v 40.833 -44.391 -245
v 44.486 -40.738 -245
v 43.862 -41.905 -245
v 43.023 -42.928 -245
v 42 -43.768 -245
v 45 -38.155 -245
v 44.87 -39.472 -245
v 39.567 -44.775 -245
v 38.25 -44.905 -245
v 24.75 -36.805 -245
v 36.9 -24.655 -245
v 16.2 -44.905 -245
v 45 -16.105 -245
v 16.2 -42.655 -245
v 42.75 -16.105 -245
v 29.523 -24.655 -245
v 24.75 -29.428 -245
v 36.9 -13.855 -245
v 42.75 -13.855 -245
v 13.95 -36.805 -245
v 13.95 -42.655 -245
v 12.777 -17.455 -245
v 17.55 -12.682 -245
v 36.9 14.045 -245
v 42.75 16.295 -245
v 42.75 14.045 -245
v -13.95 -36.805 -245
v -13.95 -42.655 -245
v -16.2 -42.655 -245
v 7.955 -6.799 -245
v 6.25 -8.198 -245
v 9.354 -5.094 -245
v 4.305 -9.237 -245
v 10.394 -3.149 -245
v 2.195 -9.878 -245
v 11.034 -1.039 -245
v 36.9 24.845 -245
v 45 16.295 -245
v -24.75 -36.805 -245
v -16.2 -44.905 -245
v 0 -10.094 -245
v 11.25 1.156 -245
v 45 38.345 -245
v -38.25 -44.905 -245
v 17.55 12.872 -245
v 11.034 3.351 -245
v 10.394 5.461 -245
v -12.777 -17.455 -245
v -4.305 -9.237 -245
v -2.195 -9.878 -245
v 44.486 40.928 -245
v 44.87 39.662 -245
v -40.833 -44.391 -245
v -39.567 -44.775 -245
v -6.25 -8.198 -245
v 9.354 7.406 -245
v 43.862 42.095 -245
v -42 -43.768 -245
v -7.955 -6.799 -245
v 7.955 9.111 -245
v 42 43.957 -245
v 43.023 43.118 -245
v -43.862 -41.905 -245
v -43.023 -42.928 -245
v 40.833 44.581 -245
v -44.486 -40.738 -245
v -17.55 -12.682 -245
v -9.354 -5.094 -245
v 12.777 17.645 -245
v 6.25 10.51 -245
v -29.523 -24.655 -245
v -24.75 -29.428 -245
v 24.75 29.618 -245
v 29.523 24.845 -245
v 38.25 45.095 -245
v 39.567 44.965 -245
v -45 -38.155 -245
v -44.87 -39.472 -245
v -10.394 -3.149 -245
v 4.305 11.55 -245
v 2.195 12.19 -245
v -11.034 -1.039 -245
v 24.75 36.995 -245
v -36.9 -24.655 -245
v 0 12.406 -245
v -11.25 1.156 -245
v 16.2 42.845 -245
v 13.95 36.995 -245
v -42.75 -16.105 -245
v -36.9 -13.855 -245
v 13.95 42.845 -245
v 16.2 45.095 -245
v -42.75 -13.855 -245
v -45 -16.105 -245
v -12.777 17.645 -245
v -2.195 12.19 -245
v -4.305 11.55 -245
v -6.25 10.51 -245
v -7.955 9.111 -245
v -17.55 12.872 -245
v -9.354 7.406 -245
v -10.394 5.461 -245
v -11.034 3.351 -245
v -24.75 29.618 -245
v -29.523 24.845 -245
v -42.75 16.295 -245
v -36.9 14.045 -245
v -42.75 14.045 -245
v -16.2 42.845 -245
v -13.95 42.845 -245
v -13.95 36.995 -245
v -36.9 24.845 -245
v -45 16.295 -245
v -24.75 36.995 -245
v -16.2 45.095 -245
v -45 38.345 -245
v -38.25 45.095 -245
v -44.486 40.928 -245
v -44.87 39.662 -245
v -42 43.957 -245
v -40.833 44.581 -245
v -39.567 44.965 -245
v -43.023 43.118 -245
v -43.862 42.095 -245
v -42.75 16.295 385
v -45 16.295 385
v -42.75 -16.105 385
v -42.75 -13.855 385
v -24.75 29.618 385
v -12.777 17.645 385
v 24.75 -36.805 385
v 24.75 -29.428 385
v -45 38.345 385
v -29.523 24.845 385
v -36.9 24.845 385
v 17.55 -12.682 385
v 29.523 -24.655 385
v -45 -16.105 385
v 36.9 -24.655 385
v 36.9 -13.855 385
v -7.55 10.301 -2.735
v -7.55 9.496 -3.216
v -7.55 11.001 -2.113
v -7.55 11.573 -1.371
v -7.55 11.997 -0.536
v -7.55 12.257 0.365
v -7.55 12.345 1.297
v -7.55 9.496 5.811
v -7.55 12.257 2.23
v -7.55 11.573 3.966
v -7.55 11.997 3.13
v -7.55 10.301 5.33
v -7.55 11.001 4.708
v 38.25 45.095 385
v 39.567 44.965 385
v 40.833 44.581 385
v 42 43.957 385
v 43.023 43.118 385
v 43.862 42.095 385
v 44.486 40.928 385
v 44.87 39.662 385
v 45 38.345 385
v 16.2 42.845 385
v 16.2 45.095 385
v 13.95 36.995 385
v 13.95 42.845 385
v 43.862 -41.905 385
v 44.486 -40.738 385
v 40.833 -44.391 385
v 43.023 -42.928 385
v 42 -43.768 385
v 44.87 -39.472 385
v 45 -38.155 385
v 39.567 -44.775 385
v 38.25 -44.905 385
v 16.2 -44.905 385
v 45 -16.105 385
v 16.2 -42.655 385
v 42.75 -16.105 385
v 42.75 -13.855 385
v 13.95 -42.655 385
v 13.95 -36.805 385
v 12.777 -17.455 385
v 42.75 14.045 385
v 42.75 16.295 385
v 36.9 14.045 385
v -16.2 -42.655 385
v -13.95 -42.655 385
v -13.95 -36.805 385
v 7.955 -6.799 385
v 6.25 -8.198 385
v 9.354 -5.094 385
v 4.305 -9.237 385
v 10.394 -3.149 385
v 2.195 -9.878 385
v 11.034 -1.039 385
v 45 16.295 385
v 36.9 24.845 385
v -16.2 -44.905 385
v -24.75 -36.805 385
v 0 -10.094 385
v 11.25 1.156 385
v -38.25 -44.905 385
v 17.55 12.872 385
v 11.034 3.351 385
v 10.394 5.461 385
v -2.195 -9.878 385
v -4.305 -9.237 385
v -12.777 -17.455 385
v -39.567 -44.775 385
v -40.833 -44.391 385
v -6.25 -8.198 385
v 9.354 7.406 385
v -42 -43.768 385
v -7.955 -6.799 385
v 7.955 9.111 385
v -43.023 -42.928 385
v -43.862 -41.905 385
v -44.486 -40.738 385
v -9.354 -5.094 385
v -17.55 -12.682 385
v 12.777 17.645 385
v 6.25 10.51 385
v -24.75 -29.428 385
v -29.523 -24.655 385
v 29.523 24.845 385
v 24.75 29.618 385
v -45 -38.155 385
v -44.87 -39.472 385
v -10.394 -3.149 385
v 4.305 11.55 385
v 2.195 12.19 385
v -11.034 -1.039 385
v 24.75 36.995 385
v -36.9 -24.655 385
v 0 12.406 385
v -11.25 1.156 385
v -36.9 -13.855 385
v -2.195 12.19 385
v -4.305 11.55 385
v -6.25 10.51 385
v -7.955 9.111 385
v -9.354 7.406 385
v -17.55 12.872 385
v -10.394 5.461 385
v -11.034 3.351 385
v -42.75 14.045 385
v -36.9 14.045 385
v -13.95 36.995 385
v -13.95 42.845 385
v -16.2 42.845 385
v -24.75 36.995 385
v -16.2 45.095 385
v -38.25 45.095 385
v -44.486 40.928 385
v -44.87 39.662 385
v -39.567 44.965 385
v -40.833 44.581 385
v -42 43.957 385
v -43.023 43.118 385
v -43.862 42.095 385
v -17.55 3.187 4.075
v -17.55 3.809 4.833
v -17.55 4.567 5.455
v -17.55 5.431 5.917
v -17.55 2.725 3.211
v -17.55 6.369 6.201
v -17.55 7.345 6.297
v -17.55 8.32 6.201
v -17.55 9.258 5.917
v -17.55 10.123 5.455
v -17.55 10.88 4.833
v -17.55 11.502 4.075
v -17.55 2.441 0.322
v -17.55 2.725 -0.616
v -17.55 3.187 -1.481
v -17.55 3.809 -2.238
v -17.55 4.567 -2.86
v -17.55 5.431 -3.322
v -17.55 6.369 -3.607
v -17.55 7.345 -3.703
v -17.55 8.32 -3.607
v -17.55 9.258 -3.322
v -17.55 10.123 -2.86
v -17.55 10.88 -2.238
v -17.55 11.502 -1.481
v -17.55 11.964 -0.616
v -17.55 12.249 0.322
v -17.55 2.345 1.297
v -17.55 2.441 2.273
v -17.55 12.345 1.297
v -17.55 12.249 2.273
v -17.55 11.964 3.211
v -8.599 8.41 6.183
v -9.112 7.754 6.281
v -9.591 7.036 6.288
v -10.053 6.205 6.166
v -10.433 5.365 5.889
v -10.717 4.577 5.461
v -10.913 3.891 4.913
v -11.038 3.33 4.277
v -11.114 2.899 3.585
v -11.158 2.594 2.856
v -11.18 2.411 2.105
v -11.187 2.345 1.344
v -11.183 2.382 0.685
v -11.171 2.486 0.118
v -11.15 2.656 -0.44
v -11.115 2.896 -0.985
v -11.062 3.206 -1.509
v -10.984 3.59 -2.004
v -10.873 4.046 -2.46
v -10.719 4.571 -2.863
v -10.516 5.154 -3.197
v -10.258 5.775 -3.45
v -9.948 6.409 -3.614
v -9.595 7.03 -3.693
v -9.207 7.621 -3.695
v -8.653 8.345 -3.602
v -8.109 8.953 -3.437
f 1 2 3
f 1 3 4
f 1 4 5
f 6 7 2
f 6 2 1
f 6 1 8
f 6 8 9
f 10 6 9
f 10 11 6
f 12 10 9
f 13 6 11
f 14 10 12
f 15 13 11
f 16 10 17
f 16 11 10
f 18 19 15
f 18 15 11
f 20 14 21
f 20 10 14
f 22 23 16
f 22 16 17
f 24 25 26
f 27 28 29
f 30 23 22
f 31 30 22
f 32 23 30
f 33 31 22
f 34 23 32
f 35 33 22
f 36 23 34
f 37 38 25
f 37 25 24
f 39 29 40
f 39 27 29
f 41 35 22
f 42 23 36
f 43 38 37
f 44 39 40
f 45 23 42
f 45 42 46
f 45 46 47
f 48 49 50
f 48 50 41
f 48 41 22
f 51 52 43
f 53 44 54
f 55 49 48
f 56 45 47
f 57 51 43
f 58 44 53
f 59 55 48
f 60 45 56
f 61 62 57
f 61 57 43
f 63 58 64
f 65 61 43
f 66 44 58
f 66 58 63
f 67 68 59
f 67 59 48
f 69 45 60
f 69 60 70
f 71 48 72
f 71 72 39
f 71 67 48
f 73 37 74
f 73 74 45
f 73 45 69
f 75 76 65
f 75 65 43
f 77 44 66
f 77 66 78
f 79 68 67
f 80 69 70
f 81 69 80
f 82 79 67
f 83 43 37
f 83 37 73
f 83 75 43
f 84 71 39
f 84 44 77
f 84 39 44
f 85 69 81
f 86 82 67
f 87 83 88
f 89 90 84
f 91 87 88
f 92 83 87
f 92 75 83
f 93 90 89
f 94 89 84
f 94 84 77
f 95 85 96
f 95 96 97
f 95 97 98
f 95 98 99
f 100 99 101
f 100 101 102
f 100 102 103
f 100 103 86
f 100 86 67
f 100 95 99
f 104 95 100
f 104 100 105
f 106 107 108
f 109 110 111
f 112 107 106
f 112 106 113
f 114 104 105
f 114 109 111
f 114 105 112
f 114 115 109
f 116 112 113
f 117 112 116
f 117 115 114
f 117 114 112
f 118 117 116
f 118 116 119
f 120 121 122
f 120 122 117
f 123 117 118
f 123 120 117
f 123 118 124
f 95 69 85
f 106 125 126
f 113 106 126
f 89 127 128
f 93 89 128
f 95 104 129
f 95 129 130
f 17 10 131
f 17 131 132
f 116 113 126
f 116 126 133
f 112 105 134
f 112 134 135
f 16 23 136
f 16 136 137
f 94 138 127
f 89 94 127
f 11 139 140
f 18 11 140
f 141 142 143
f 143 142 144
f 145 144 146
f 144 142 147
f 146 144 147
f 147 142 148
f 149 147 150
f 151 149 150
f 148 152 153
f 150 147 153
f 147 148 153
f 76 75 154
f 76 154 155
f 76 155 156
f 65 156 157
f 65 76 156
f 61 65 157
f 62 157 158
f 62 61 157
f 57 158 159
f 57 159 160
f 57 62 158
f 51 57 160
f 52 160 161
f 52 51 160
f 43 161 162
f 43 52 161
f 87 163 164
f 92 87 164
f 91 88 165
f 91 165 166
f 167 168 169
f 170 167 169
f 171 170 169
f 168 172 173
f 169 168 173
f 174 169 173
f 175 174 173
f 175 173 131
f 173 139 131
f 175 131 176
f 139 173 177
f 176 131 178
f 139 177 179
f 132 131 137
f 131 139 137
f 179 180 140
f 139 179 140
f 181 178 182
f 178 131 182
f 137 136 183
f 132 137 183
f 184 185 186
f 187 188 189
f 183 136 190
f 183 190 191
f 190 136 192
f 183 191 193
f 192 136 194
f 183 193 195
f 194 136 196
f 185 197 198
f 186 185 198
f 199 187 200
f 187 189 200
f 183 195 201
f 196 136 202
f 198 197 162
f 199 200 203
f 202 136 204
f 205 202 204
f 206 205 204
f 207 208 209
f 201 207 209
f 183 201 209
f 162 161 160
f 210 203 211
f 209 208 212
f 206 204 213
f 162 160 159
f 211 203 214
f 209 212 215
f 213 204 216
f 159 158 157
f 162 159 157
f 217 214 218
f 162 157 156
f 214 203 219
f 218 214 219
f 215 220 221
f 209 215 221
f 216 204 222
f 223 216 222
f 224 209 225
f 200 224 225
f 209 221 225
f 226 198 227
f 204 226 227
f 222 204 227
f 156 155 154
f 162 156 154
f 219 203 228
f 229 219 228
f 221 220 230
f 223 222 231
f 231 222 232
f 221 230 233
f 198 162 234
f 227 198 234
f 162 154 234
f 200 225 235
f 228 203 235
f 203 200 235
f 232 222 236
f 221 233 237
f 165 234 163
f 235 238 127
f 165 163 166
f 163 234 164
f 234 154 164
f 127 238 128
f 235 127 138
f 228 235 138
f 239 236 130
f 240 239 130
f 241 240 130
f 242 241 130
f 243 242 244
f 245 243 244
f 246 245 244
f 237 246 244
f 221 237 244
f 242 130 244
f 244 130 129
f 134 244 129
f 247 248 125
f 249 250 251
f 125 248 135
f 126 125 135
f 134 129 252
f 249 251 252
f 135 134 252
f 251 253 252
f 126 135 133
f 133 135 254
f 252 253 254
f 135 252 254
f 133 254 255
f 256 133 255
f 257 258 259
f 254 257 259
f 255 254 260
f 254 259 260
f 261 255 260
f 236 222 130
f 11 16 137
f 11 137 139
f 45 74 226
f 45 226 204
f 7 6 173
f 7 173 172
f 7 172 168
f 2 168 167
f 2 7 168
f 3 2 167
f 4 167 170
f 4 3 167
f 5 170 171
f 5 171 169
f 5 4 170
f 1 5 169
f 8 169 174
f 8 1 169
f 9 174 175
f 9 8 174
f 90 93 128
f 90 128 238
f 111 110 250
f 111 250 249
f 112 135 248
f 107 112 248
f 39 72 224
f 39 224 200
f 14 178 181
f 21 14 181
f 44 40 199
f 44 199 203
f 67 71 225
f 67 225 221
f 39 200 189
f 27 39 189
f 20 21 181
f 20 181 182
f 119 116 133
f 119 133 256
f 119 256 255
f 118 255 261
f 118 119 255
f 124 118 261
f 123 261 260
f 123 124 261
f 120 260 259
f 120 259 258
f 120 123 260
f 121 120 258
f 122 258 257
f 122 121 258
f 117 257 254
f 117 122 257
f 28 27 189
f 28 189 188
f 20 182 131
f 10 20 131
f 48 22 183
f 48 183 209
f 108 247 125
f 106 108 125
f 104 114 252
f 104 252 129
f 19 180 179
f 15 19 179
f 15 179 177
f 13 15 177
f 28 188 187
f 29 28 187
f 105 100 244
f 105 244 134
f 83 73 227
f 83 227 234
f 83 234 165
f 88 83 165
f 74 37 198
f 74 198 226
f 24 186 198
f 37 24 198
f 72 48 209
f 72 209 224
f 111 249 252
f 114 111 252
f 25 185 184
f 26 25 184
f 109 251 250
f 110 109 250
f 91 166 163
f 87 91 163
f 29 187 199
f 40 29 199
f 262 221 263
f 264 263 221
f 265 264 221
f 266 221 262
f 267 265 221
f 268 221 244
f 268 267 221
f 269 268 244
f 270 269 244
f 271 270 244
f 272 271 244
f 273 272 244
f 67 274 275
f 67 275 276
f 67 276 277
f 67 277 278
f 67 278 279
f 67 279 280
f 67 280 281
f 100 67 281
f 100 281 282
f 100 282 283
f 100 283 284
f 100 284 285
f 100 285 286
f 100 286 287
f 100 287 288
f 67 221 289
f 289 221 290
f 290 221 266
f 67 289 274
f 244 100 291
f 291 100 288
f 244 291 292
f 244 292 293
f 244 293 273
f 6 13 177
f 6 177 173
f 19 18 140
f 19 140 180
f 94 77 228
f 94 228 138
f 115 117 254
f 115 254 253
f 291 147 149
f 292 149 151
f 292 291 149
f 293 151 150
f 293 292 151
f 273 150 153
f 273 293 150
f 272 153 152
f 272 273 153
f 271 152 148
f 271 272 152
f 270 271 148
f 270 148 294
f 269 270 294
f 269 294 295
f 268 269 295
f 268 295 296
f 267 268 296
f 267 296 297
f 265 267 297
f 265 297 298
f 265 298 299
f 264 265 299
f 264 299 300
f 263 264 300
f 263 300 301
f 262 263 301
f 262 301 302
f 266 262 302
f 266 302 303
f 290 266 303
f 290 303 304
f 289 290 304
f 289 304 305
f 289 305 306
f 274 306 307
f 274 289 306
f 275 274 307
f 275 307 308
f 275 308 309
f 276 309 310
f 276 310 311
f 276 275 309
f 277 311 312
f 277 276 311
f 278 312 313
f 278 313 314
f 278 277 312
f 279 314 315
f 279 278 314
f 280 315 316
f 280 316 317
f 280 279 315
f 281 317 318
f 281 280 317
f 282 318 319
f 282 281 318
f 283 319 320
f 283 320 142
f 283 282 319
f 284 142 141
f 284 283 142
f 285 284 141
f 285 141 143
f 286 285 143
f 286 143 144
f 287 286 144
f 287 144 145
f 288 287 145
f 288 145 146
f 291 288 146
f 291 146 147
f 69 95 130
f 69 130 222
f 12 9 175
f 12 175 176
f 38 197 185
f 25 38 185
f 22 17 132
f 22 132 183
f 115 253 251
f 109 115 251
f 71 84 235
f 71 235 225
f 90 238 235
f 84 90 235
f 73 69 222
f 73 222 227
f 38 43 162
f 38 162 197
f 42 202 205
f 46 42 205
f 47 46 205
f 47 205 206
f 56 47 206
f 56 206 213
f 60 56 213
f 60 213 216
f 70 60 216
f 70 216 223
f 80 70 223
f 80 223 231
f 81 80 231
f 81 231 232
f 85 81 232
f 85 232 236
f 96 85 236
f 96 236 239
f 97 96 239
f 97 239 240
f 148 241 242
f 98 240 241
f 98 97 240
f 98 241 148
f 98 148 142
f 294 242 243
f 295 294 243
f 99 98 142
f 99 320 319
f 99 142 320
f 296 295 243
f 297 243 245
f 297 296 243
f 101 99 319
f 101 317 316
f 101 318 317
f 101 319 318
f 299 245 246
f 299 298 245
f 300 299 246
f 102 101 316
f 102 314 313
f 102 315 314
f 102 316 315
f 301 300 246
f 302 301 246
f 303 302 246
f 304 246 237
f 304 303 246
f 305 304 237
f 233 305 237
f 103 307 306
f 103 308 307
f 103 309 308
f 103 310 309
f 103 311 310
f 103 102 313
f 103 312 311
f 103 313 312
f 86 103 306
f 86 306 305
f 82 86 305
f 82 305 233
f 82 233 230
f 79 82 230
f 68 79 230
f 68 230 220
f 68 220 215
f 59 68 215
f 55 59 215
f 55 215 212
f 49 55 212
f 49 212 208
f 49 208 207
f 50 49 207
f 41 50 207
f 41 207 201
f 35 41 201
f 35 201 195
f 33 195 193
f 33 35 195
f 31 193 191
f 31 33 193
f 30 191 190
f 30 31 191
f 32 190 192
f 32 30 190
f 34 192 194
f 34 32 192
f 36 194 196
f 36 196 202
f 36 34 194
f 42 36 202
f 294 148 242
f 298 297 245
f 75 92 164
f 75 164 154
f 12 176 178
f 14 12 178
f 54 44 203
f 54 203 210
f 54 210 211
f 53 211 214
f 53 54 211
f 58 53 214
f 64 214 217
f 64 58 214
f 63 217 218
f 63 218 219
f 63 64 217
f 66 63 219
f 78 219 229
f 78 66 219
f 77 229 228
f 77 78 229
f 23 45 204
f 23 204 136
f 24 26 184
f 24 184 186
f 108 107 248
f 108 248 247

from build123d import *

# Parameters (mm, degrees)
SKETCH1_R           = 2.5
BOSS_EXTRUDE1_DEPTH = 140
SCALE_2_SCALE       = 3
SCALE_3_SCALE       = 6
SCALE_5_SCALE       = 2
SCALE_6_SCALE       = 0.25
SCALE_7_SCALE       = 0.125
SCALE_8_SCALE       = 0.25
SCALE_9_SCALE       = 4
SCALE_10_SCALE      = 4
OTHER_START         = -17.55
OTHER_1_OUTLINE_R   = 5
OTHER_1_DEPTH       = 10


# Read off the part's stored shape, not the designer's step: 孔1
with BuildPart() as part:
    # Sketch1 → Boss-Extrude1 (new body)
    with BuildSketch(Plane.XY):
        with BuildLine():
            Line((2.839339828, 3.9), (5.5, 6.560660172))
            Line((5.5, 6.560660172), (5.5, 8.2))
            Line((5.5, 8.2), (3.1, 8.2))
            Line((3.1, 8.2), (3.1, 9.5))
            Line((3.1, 9.5), (3.6, 9.5))
            Line((3.6, 9.5), (3.6, 10))
            Line((3.6, 10), (8.5, 10))
            ThreePointArc((8.5, 10), (9.560660172, 9.560660172), (10, 8.5))
            Line((10, 8.5), (10, 3.6))
            Line((10, 3.6), (9.5, 3.6))
            Line((9.5, 3.6), (9.5, 3.1))
            Line((9.5, 3.1), (8.2, 3.1))
            Line((8.2, 3.1), (8.2, 5.5))
            Line((8.2, 5.5), (6.560660172, 5.5))
            Line((6.560660172, 5.5), (3.9, 2.839339828))
            Line((3.9, 2.839339828), (3.9, -2.839339828))
            Line((3.9, -2.839339828), (6.560660172, -5.5))
            Line((6.560660172, -5.5), (8.2, -5.5))
            Line((8.2, -5.5), (8.2, -3.1))
            Line((8.2, -3.1), (9.5, -3.1))
            Line((9.5, -3.1), (9.5, -3.6))
            Line((9.5, -3.6), (10, -3.6))
            Line((10, -3.6), (10, -8.5))
            ThreePointArc((10, -8.5), (9.560660172, -9.560660172), (8.5, -10))
            Line((8.5, -10), (3.6, -10))
            Line((3.6, -10), (3.6, -9.5))
            Line((3.6, -9.5), (3.1, -9.5))
            Line((3.1, -9.5), (3.1, -8.2))
            Line((3.1, -8.2), (5.5, -8.2))
            Line((5.5, -8.2), (5.5, -6.560660172))
            Line((5.5, -6.560660172), (2.839339828, -3.9))
            Line((2.839339828, -3.9), (-2.839339828, -3.9))
            Line((-2.839339828, -3.9), (-5.5, -6.560660172))
            Line((-5.5, -6.560660172), (-5.5, -8.2))
            Line((-5.5, -8.2), (-3.1, -8.2))
            Line((-3.1, -8.2), (-3.1, -9.5))
            Line((-3.1, -9.5), (-3.6, -9.5))
            Line((-3.6, -9.5), (-3.6, -10))
            Line((-3.6, -10), (-8.5, -10))
            ThreePointArc((-8.5, -10), (-9.560660172, -9.560660172), (-10, -8.5))
            Line((-10, -8.5), (-10, -3.6))
            Line((-10, -3.6), (-9.5, -3.6))
            Line((-9.5, -3.6), (-9.5, -3.1))
            Line((-9.5, -3.1), (-8.2, -3.1))
            Line((-8.2, -3.1), (-8.2, -5.5))
            Line((-8.2, -5.5), (-6.560660172, -5.5))
            Line((-6.560660172, -5.5), (-3.9, -2.839339828))
            Line((-3.9, -2.839339828), (-3.9, 2.839339828))
            Line((-3.9, 2.839339828), (-6.560660172, 5.5))
            Line((-6.560660172, 5.5), (-8.2, 5.5))
            Line((-8.2, 5.5), (-8.2, 3.1))
            Line((-8.2, 3.1), (-9.5, 3.1))
            Line((-9.5, 3.1), (-9.5, 3.6))
            Line((-9.5, 3.6), (-10, 3.6))
            Line((-10, 3.6), (-10, 8.5))
            ThreePointArc((-10, 8.5), (-9.560660172, 9.560660172), (-8.5, 10))
            Line((-8.5, 10), (-3.6, 10))
            Line((-3.6, 10), (-3.6, 9.5))
            Line((-3.6, 9.5), (-3.1, 9.5))
            Line((-3.1, 9.5), (-3.1, 8.2))
            Line((-3.1, 8.2), (-5.5, 8.2))
            Line((-5.5, 8.2), (-5.5, 6.560660172))
            Line((-5.5, 6.560660172), (-2.839339828, 3.9))
            Line((-2.839339828, 3.9), (2.839339828, 3.9))
        make_face()
        with Locations((0, 0.235847297)):
            Circle(SKETCH1_R, mode=Mode.SUBTRACT)
    extrude(amount=BOSS_EXTRUDE1_DEPTH)


with BuildPart() as part_1:
    # 缩放比例2: scaled about (0, -0.027095247, 70)
    add(part.part.scale(SCALE_2_SCALE).moved(Location((0, 0.054190494, -140))))


with BuildPart() as part_2:
    # 缩放比例3: scaled about (0, -0.027095247, 70)
    add(part_1.part.scale(SCALE_3_SCALE).moved(Location((0, 0.135476235, -350))))


with BuildPart() as part_3:
    # 缩放比例5: scaled about (0, -0.027095249, 70)
    add(part_2.part.scale(SCALE_5_SCALE).moved(Location((0, 0.027095249, -70))))


with BuildPart() as part_4:
    # 缩放比例6: scaled about (0, -0.027095249, 70)
    add(part_3.part.scale(SCALE_6_SCALE).moved(Location((0, -0.020321437, 52.5))))


with BuildPart() as part_5:
    # 缩放比例7: scaled about (0, -0.027095249, 70)
    add(part_4.part.scale(SCALE_7_SCALE).moved(Location((0, -0.023708343, 61.25))))


with BuildPart() as part_6:
    # 缩放比例8: scaled about (0, -0.027095249, 70)
    add(part_5.part.scale(SCALE_8_SCALE).moved(Location((0, -0.020321437, 52.5))))


with BuildPart() as part_7:
    # 缩放比例9: scaled about (0, -0.027095249, 70)
    add(part_6.part.scale(SCALE_9_SCALE).moved(Location((0, 0.081285747, -210))))


with BuildPart() as part_8:
    # 缩放比例10: scaled about (0, -0.027095249, 70)
    add(part_7.part.scale(SCALE_10_SCALE).moved(Location((0, 0.081285747, -210))))

    # 孔1 outline → 孔1 (cut)
    with BuildSketch(Plane.YZ.offset(OTHER_START)):
        with Locations((7.344833538, 1.297306883)):
            Circle(OTHER_1_OUTLINE_R)
    extrude(amount=OTHER_1_DEPTH, mode=Mode.SUBTRACT)


solid = part_8.part
